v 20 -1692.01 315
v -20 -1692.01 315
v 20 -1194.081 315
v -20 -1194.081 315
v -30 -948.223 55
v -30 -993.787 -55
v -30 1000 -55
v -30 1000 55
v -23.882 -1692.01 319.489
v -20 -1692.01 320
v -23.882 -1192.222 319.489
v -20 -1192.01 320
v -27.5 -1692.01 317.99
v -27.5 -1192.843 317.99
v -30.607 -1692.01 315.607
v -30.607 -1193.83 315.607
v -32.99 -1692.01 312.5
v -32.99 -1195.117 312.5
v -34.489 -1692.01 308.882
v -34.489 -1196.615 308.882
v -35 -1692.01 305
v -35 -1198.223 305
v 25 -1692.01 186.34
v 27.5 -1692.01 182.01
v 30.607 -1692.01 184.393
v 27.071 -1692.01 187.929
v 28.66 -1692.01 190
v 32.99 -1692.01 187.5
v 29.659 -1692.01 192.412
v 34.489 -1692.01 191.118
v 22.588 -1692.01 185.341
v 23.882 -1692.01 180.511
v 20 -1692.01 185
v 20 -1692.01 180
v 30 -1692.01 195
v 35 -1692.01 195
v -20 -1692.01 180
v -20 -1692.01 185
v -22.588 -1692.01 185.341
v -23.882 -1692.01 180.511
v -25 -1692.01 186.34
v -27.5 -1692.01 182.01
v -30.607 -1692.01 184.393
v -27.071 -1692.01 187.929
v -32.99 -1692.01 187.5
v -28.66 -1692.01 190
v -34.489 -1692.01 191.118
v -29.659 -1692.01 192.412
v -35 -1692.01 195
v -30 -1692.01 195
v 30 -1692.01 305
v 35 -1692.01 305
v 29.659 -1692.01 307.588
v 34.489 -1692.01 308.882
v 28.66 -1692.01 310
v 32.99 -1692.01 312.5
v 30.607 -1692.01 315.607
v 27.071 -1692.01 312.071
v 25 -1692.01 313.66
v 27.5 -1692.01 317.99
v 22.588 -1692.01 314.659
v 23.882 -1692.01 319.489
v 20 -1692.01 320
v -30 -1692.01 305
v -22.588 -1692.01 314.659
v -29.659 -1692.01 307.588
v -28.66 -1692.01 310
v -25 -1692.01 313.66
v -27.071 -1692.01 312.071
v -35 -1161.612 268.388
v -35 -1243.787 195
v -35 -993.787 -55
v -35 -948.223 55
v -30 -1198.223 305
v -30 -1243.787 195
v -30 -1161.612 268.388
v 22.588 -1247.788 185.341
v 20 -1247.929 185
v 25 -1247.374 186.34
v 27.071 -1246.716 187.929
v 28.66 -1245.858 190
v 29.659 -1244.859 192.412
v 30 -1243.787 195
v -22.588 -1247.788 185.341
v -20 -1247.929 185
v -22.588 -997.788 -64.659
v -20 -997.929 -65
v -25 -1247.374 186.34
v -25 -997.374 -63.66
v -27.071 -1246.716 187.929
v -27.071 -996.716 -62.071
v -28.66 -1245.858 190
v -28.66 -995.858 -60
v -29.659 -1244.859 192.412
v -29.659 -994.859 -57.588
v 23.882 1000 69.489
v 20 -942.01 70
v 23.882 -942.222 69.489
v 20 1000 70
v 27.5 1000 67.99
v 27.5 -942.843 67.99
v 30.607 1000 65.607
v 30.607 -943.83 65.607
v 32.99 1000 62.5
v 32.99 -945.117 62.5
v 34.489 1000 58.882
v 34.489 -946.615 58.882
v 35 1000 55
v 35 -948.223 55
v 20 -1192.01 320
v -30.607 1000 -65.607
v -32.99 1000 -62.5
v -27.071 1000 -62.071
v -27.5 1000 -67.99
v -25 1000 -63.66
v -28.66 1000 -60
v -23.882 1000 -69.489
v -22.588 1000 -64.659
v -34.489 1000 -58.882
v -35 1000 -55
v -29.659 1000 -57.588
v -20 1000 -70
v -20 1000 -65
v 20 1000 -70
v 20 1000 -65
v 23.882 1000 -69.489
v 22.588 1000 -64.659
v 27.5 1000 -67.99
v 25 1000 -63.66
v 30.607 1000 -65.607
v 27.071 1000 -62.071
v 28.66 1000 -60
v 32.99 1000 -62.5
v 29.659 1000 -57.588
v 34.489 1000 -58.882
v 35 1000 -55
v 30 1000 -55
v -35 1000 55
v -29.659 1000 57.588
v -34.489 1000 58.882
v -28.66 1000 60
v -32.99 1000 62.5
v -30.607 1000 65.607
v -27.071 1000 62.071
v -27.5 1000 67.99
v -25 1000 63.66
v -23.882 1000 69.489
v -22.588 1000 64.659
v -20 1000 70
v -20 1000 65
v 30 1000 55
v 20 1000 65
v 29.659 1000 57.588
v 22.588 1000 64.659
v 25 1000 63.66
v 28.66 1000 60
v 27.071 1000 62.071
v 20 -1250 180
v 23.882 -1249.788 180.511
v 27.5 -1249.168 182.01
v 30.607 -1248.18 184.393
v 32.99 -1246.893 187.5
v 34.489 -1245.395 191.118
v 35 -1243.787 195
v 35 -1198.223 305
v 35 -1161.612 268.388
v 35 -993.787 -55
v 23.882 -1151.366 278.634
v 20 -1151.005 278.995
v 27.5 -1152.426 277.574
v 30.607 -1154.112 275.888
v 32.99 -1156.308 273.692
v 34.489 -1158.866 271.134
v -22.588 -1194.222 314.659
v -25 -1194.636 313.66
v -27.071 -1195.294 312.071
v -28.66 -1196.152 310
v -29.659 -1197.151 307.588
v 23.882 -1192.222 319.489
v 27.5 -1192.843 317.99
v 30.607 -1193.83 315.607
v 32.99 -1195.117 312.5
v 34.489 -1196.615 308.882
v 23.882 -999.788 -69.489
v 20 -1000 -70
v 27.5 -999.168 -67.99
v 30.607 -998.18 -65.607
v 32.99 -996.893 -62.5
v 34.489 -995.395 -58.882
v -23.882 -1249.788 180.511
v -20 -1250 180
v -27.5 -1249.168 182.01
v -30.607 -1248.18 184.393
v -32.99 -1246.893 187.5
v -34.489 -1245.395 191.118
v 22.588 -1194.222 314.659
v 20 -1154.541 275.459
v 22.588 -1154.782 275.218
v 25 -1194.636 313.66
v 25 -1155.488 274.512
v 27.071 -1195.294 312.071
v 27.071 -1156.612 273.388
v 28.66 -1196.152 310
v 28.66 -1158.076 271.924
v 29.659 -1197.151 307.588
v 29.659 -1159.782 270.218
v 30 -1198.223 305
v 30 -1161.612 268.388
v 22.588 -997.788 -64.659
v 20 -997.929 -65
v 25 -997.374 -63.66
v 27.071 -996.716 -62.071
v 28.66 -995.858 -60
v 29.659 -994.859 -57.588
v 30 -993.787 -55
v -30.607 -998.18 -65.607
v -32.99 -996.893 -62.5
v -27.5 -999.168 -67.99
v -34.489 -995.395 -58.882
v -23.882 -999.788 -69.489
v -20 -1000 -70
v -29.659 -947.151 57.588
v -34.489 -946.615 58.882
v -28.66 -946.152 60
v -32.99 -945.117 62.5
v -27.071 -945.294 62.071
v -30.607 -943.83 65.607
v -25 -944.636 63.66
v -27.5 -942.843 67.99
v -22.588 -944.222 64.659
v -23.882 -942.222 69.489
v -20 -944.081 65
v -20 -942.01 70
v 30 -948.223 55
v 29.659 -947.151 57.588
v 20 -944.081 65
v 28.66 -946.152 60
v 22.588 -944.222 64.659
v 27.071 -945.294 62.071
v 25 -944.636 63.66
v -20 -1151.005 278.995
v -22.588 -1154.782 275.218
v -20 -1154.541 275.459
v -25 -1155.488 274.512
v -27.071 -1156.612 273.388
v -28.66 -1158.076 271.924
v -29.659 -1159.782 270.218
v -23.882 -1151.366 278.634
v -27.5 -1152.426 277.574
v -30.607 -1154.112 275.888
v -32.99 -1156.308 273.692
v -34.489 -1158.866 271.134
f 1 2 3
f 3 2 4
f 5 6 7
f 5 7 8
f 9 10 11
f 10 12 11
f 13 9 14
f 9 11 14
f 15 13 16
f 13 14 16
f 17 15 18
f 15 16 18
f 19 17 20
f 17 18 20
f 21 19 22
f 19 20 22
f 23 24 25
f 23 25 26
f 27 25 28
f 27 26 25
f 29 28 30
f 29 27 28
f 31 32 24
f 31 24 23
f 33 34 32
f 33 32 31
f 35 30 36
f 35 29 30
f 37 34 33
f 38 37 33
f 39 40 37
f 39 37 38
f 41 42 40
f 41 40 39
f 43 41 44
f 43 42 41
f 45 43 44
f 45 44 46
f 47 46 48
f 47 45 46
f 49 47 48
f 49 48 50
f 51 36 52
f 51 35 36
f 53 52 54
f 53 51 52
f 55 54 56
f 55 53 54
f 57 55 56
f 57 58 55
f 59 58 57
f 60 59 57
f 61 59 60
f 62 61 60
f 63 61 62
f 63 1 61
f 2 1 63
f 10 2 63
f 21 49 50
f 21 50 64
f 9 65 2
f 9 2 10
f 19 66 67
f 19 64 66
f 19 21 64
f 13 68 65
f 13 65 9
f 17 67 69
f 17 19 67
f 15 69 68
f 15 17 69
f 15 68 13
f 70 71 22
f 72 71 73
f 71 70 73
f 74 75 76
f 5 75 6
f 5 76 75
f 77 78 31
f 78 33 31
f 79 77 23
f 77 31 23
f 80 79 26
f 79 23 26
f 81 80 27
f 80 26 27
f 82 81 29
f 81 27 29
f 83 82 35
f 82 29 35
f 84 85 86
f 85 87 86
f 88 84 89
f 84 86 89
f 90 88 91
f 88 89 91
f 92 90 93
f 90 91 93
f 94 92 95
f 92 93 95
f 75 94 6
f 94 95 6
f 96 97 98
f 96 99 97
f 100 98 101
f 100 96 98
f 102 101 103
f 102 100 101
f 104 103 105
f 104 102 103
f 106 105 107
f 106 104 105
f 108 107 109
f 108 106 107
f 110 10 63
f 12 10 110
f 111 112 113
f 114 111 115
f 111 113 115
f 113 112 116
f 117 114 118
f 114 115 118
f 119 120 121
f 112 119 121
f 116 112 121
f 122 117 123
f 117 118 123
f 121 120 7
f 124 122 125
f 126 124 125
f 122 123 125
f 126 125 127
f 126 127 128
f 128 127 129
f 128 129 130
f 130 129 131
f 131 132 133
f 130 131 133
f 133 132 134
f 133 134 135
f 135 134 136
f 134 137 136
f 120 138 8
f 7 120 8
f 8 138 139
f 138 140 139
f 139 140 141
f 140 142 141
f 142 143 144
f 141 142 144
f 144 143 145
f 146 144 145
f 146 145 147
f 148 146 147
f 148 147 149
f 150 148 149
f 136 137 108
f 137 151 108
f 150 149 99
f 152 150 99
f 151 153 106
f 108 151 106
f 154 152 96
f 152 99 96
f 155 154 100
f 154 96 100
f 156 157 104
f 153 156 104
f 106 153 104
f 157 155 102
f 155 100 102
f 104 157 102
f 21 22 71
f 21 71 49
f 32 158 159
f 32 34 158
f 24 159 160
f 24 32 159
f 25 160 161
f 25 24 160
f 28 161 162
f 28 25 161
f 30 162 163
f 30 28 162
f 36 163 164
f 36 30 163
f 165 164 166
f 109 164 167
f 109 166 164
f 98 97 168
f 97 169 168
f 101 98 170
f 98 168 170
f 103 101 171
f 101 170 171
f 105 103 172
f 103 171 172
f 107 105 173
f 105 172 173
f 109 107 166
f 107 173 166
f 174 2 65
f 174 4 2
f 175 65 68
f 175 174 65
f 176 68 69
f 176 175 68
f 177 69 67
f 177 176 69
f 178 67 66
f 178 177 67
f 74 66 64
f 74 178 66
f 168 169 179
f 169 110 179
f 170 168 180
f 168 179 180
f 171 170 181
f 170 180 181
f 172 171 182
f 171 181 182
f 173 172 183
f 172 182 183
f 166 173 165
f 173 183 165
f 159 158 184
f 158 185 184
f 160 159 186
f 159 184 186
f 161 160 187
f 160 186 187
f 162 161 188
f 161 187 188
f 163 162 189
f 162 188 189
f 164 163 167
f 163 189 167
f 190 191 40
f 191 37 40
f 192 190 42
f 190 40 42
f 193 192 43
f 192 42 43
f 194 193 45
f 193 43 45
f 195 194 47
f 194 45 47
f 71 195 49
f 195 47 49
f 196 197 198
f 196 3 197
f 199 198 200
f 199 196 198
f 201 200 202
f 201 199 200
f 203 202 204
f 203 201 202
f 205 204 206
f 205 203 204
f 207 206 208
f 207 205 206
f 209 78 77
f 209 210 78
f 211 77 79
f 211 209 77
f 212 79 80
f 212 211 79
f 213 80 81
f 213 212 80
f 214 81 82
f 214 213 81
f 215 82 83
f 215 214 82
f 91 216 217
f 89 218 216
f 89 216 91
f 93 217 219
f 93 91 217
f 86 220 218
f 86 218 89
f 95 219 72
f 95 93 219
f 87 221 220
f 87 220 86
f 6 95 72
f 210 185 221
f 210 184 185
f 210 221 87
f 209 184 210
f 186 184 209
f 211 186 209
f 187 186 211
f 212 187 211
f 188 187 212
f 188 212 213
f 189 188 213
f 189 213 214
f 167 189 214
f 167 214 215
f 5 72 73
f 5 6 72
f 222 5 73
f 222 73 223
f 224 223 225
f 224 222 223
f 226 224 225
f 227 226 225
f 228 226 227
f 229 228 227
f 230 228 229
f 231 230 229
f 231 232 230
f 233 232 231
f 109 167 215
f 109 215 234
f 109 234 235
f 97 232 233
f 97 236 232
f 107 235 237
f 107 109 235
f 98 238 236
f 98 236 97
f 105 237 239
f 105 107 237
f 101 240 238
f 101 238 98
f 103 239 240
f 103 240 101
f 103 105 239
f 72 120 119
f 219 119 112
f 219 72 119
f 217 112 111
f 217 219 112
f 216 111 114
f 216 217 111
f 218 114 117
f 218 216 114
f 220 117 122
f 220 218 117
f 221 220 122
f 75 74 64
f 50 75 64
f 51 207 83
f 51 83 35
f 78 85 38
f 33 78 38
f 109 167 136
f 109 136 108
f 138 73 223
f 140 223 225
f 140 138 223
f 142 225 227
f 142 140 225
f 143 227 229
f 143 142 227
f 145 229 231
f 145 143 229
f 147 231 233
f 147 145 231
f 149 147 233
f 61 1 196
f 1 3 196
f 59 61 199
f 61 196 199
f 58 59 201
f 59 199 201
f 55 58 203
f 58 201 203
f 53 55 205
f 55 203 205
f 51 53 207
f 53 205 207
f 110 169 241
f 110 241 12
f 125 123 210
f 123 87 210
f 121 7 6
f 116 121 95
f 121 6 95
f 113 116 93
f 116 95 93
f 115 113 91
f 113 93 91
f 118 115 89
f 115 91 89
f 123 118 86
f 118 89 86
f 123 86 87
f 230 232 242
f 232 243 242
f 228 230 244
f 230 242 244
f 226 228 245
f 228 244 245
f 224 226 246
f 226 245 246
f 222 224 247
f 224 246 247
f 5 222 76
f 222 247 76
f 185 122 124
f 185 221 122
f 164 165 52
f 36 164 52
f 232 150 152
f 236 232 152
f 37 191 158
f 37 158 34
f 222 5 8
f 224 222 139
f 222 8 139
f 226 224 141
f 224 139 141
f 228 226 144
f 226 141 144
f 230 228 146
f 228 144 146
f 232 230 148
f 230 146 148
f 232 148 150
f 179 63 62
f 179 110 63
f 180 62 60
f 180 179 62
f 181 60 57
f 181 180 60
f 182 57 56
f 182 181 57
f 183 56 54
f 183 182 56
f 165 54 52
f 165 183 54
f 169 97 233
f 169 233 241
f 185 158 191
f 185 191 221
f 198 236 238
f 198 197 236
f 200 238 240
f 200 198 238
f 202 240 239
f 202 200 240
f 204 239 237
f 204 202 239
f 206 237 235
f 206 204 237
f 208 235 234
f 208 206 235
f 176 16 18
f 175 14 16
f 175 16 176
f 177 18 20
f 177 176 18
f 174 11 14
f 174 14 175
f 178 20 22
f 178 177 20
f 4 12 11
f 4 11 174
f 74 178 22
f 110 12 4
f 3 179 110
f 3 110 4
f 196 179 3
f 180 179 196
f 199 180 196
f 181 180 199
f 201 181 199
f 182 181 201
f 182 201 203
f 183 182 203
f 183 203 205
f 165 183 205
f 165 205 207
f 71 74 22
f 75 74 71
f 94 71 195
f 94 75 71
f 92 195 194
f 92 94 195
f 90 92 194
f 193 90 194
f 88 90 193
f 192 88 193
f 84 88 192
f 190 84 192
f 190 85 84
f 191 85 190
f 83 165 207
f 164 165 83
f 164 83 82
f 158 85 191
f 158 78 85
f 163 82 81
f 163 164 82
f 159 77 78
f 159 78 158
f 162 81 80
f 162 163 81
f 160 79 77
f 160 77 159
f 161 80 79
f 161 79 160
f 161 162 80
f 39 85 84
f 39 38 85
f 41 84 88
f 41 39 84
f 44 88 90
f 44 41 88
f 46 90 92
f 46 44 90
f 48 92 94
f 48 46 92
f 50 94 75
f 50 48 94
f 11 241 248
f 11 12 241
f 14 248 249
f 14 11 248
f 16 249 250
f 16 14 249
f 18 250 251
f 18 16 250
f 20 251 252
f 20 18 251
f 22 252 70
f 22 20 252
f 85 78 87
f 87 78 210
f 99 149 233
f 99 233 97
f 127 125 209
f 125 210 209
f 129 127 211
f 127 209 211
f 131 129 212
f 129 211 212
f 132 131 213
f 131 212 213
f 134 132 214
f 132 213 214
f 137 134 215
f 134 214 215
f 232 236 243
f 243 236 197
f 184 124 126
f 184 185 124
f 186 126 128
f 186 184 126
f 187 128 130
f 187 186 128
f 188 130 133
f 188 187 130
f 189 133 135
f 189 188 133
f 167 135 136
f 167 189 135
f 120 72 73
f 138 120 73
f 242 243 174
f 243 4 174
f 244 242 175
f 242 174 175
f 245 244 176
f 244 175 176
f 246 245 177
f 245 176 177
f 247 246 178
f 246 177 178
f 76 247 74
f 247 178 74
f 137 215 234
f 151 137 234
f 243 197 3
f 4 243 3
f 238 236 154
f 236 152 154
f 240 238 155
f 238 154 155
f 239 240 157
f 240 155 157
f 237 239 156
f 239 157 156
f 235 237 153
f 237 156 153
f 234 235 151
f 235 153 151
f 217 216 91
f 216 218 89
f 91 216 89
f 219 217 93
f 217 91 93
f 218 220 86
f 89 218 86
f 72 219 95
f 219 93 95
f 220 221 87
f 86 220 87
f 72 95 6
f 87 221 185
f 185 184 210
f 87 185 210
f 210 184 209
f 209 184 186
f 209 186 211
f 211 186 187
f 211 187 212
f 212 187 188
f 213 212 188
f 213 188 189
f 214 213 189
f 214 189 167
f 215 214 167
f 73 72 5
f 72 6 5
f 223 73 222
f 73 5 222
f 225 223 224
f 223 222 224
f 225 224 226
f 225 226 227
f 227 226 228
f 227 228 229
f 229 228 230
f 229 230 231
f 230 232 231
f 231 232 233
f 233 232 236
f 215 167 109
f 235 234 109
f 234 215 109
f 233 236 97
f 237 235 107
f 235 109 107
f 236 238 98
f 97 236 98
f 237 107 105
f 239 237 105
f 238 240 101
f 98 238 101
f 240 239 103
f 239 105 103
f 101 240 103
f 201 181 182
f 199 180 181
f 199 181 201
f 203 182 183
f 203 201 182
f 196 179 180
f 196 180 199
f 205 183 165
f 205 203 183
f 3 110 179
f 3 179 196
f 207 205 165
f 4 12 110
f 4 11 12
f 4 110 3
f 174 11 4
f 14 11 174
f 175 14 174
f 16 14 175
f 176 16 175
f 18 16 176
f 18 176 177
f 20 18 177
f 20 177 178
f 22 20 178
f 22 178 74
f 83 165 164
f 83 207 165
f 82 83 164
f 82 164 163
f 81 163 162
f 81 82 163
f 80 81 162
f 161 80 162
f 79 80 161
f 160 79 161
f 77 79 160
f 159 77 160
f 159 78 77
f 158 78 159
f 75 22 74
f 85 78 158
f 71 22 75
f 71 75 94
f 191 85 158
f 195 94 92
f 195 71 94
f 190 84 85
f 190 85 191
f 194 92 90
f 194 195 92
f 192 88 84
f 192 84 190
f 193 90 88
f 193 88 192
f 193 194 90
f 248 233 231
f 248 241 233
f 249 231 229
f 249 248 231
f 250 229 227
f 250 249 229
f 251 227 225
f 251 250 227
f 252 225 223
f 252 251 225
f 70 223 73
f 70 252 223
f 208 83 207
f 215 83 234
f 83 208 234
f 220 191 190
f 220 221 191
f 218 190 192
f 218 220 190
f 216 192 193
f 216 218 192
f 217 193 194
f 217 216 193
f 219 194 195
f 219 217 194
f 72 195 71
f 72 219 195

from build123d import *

# Parameters (mm, degrees)
F0_W     = 70
F0_H     = 140
F1_DEPTH = 1000
F3_DEPTH = 70
F4_DEPTH = 70
F5_R     = 15
F6_T     = -5
F8_DEPTH = 70
F9_R     = 15
F9_2_R   = 15
F10_T    = -5
F11_T    = -5


with BuildPart() as f1:
    # F0 (on Front) → F1 (new body, symmetric)
    with BuildSketch(Plane.XZ):
        Rectangle(F0_W, F0_H)
    extrude(amount=F1_DEPTH, both=True)

    # F2 (on face) → F3 (cut)
    with BuildSketch(Plane.YZ.offset(35)):
        Polygon((-1000, 70), (-1000, -70), (-942.010101, 70), align=None)
    extrude(amount=-F3_DEPTH, mode=Mode.SUBTRACT)

    # F5
    f5_edges = [f1.edges().sort_by_distance(p)[0] for p in [
        (35, 28.994949, 70),
        (-35, 28.994949, 70),
        (35, 0, -70),
        (-35, 0, -70),
    ]]
    fillet(f5_edges, radius=F5_R)

    # F6
    f6_openings = [f1.faces().sort_by_distance(p)[0] for p in [
        (0, -971.005051, 0),
        (0, 1000, 0),
    ]]
    offset(amount=F6_T, openings=f6_openings)


with BuildPart() as f4:
    # F2 (on face) → F4 (new body)
    with BuildSketch(Plane.YZ.offset(35)):
        Polygon((-1250, 180), (-1000, -70), (-1000, 70), (-942.010101, 70), (-1151.005051, 278.994949), (-1192.010101, 320), align=None)
        Polygon((-1000, 70), (-1000, -70), (-942.010101, 70), align=None)
    extrude(amount=-F4_DEPTH)

    # F9
    f9_edges = [f4.edges().sort_by_distance(p)[0] for p in [
        (35, -1067.010101, 195),
        (-35, -1067.010101, 195),
        (35, -1125, 55),
        (-35, -1125, 55),
    ]]
    fillet(f9_edges, radius=F9_R)

    # F10
    f10_openings = [f4.faces().sort_by_distance(p)[0] for p in [
        (0, -971.005051, 0),
        (0, -1221.005051, 250),
    ]]
    offset(amount=F10_T, openings=f10_openings)


with BuildPart() as f8:
    # F7 (on face) → F8 (new body)
    with BuildSketch(Plane(origin=(-35, 0, 0), x_dir=(0, -1, 0), z_dir=(-1, 0, 0))):
        Polygon((1692.010101, 320), (1192.010101, 320), (1250, 180), (1692.010101, 180), align=None)
    extrude(amount=-F8_DEPTH)

    # F9#2
    f9_2_edges = [f8.edges().sort_by_distance(p)[0] for p in [
        (35, -1471.005051, 180),
        (-35, -1471.005051, 180),
        (-35, -1442.010101, 320),
        (35, -1442.010101, 320),
    ]]
    fillet(f9_2_edges, radius=F9_2_R)

    # F11
    f11_openings = [f8.faces().sort_by_distance(p)[0] for p in [
        (0, -1221.005051, 250),
        (0, -1692.010101, 250),
    ]]
    offset(amount=F11_T, openings=f11_openings)


solid = Compound([f1.part, f4.part, f8.part])
